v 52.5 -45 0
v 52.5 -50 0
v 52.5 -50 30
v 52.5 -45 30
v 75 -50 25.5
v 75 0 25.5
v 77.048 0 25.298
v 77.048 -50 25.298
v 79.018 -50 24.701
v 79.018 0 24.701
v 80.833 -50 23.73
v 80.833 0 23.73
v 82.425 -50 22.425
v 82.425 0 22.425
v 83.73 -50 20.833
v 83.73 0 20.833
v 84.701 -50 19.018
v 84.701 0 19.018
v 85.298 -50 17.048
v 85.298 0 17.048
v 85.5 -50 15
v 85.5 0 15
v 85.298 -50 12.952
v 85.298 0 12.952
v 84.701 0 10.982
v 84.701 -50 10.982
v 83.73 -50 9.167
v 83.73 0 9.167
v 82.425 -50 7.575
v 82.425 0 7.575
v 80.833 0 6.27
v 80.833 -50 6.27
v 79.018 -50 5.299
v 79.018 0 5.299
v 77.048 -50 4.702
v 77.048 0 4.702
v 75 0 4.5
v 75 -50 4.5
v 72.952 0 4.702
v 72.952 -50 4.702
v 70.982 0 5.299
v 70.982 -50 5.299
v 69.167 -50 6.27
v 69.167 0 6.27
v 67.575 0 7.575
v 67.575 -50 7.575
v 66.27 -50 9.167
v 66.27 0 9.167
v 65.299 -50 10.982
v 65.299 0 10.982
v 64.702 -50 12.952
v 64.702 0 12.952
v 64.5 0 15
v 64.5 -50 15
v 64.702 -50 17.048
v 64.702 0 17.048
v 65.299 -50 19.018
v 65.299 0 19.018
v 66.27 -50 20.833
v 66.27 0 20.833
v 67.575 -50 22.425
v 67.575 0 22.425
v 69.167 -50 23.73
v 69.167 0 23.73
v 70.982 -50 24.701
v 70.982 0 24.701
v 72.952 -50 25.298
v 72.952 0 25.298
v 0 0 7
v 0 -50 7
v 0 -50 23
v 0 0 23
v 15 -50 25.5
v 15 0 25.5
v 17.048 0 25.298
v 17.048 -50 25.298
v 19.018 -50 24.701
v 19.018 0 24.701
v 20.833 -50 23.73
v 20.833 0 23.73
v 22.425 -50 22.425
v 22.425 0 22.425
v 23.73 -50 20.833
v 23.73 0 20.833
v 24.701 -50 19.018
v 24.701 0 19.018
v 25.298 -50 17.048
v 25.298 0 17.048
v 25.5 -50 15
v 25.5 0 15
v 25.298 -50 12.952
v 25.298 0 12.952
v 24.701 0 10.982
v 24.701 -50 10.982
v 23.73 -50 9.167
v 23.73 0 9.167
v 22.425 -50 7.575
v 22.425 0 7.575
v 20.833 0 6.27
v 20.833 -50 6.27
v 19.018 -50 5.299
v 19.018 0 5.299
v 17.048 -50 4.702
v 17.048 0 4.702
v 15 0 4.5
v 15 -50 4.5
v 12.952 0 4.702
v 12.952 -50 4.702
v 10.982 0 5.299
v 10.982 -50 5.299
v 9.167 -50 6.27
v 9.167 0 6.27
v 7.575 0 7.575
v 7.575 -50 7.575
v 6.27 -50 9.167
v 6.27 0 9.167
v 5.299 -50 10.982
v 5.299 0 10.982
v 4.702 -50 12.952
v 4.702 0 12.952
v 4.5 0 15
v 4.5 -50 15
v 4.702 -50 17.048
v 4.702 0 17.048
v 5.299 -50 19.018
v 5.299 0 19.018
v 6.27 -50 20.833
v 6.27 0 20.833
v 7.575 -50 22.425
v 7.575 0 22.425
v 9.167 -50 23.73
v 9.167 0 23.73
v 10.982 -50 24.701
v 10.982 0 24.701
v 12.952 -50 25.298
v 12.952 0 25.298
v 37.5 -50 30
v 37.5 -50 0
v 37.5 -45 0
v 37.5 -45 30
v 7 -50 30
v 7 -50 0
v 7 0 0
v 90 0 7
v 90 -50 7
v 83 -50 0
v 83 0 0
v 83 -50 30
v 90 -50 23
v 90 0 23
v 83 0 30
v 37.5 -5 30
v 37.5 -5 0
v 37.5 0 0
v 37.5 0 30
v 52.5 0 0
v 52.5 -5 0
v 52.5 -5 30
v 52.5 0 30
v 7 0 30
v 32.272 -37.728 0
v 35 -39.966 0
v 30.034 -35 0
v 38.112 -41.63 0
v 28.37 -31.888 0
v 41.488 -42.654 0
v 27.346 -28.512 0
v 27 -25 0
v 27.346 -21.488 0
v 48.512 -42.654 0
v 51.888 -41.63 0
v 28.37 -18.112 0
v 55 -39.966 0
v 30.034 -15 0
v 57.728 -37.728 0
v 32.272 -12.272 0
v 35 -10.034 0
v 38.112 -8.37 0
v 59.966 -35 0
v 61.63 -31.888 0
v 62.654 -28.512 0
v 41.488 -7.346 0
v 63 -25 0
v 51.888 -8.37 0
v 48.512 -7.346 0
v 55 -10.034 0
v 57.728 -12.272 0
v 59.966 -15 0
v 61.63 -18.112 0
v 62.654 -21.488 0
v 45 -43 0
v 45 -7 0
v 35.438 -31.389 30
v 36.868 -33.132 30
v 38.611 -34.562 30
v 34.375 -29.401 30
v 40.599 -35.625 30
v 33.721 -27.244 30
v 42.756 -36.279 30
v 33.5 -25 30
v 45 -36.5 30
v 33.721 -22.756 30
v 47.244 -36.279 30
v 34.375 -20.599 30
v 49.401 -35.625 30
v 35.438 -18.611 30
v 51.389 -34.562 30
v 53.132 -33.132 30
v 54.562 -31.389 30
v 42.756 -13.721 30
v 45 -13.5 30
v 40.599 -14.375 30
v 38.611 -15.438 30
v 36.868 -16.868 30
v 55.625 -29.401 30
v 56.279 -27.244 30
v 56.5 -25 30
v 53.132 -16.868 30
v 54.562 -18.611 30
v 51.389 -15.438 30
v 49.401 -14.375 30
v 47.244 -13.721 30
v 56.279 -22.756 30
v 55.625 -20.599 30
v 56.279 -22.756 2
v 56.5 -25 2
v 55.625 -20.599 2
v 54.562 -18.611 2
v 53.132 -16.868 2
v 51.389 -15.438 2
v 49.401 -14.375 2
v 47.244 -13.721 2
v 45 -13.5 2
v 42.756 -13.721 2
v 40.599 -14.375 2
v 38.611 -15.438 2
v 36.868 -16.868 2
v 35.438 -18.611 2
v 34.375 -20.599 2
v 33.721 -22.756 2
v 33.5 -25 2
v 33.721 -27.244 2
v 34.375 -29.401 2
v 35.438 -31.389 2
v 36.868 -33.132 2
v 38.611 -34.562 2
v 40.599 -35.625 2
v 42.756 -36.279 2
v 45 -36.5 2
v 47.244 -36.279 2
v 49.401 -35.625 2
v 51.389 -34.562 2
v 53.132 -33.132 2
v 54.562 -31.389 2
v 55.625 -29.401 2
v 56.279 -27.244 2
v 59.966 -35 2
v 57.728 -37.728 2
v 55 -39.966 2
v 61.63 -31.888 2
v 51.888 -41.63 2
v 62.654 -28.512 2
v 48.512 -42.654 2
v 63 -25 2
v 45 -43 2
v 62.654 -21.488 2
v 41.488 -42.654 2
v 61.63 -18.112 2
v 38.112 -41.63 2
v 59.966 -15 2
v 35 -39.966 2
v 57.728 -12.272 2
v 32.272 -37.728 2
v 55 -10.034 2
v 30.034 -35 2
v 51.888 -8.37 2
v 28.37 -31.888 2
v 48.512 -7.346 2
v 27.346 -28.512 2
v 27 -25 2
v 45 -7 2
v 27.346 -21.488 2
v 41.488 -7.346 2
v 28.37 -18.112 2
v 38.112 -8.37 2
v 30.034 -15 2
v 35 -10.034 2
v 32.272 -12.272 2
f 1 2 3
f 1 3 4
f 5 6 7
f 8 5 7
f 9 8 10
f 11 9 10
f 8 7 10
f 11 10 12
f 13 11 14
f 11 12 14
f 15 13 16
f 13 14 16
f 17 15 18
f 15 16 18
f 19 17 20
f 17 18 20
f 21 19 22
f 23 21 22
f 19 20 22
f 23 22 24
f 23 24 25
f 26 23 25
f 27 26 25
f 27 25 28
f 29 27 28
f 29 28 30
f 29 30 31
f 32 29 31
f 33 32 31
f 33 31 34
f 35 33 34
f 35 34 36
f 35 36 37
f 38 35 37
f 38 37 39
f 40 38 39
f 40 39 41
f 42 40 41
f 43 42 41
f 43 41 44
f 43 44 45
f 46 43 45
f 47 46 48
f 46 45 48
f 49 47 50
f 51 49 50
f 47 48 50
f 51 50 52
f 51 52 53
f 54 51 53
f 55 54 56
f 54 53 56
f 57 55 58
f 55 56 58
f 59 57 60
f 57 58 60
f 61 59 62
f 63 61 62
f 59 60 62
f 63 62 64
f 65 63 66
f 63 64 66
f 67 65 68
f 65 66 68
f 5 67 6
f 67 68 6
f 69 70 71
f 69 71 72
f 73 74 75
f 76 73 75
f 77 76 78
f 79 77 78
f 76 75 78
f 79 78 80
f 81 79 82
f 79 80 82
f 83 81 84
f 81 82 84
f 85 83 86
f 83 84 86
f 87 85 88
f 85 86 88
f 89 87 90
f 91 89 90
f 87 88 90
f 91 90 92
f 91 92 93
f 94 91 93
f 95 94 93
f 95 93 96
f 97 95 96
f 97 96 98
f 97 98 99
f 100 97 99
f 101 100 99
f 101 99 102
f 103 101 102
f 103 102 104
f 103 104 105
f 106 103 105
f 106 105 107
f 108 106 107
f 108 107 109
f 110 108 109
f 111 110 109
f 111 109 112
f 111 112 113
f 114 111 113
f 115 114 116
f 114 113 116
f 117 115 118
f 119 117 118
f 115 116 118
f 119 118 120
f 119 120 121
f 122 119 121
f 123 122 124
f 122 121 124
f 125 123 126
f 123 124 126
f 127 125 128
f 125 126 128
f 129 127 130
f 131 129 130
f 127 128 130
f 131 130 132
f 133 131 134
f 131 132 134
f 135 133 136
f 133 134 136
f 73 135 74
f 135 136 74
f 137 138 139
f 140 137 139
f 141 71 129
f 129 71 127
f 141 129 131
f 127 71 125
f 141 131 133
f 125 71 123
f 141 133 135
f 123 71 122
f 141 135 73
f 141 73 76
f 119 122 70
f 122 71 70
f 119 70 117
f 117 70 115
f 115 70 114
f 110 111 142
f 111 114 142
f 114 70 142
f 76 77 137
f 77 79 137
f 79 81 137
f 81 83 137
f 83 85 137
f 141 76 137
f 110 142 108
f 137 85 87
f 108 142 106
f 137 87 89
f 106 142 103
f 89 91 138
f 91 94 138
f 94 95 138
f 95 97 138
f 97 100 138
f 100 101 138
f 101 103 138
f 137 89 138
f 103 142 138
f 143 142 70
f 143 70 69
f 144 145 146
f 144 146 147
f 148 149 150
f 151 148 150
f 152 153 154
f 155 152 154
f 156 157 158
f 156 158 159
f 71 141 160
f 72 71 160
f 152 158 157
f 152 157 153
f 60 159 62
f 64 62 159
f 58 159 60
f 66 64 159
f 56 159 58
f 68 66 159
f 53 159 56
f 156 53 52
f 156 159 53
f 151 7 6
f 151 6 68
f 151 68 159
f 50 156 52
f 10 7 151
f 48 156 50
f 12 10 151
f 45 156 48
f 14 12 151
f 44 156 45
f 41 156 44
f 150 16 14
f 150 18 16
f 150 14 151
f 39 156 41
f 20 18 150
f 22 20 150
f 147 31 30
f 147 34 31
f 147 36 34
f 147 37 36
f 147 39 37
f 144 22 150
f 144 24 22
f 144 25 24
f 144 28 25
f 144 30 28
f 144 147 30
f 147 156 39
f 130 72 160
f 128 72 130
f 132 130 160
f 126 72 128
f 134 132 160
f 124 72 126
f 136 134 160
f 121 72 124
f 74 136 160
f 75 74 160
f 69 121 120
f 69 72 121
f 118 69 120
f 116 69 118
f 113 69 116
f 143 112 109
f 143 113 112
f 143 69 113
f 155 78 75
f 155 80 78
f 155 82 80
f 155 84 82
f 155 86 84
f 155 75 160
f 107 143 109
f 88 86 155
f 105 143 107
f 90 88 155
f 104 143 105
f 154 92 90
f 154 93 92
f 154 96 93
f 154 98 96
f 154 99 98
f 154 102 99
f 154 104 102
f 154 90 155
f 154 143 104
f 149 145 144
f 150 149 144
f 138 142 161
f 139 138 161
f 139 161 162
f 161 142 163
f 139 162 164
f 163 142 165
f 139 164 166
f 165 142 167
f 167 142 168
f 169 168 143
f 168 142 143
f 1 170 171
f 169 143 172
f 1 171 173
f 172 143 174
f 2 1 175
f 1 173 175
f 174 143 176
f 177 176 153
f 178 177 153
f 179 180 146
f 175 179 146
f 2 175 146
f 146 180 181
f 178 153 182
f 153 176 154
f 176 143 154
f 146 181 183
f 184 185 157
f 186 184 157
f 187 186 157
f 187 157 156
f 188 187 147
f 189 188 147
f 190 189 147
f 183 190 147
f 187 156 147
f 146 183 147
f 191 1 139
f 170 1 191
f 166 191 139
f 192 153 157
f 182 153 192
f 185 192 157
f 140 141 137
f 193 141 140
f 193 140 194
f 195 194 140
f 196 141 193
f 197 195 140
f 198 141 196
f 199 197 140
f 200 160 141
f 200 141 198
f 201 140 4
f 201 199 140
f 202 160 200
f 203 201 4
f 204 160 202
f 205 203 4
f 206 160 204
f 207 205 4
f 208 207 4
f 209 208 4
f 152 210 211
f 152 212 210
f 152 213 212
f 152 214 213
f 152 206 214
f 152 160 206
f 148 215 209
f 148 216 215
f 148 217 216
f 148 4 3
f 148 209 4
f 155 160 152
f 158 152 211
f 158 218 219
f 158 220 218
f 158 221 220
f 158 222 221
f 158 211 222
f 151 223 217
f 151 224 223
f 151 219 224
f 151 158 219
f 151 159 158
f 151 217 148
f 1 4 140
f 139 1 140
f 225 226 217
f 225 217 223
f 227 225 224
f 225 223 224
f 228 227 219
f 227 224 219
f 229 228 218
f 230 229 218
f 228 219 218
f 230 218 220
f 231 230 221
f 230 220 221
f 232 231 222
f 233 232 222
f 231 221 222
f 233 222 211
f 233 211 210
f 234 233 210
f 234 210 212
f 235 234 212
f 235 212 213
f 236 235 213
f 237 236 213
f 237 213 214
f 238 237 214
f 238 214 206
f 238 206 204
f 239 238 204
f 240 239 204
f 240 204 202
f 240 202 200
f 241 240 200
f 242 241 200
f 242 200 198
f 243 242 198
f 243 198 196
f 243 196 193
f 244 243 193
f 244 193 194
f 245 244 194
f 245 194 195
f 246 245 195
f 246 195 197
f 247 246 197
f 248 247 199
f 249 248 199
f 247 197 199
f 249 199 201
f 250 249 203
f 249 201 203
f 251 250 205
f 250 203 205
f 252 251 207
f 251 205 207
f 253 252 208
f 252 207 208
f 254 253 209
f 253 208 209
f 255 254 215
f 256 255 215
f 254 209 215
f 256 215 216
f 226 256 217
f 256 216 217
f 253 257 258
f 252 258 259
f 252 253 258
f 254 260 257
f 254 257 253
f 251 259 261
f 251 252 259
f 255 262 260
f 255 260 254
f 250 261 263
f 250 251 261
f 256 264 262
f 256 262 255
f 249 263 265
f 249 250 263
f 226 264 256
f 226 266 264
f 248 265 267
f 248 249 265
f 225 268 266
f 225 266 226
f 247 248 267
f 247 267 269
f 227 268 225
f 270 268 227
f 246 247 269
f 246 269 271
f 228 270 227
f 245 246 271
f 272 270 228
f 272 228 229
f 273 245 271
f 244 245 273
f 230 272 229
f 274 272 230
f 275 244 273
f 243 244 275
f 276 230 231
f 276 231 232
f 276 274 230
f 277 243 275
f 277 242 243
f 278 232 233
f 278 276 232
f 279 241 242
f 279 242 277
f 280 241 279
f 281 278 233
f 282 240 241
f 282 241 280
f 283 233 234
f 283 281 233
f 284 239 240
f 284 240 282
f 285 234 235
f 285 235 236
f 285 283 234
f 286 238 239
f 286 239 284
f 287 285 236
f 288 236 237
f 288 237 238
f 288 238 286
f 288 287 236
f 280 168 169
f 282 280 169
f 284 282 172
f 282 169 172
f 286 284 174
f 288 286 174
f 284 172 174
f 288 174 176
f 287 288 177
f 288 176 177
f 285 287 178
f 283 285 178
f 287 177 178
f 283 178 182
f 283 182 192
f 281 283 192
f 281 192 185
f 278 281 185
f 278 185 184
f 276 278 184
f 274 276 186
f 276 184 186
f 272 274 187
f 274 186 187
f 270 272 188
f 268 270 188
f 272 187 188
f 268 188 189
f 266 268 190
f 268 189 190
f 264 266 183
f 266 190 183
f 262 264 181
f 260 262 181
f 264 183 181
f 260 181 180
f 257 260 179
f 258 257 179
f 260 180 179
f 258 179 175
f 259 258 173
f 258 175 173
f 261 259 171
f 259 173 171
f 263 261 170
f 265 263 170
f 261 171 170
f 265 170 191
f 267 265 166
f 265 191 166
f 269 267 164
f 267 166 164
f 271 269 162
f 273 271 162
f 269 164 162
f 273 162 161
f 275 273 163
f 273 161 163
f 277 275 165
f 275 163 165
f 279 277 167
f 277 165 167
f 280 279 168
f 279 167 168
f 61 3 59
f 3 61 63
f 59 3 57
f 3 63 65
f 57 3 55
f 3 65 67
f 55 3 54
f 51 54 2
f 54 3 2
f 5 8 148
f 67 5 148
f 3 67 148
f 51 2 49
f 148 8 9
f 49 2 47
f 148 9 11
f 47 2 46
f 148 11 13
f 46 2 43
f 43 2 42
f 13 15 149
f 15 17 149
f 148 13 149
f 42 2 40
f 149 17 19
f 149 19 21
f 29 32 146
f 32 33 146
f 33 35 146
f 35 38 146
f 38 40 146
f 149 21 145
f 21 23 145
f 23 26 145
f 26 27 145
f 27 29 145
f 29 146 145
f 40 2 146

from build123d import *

# Parameters (mm, degrees)
SKETCH_1_W          = 90
SKETCH_1_H          = 50
EXTRUDE_1_DEPTH     = 30
SKETCH_3_R          = 10.5
CUT_EXTRUDE_2_DEPTH = 108.238052948
CHAMFER_1_SIZE      = 7
SKETCH_8_R          = 18
CUT_EXTRUDE_5_DEPTH = 2
SKETCH_7_R          = 11.5
CUT_EXTRUDE_6_DEPTH = 120
SKETCH_12_W         = 15
SKETCH_12_H         = 5
CUT_EXTRUDE_8_DEPTH = 70


with BuildPart() as part:
    # 草图1 → 拉伸1 (new body)
    with BuildSketch(Plane.XY):
        with Locations((45, -25)):
            Rectangle(SKETCH_1_W, SKETCH_1_H)
    extrude(amount=EXTRUDE_1_DEPTH)

    # 草图3 → 切除-拉伸2 (cut, through all)
    with BuildSketch(Plane(origin=(0, 0, 0), x_dir=(1, 0, 0), z_dir=(0, 1, 0))):
        with Locations(Location((15, -15, 0), (0, 0, 270))):
            Circle(SKETCH_3_R)
        with Locations(Location((75, -15, 0), (0, 0, 270))):
            Circle(SKETCH_3_R)
    extrude(amount=-CUT_EXTRUDE_2_DEPTH, mode=Mode.SUBTRACT)

    # 倒角1
    chamfer_1_edges = [part.edges().sort_by_distance(p)[0] for p in [
        (90, -25, 30),
        (0, -25, 30),
        (90, -25, 0),
        (0, -25, 0),
    ]]
    chamfer(chamfer_1_edges, length=CHAMFER_1_SIZE)

    # 草图8 → 切除-拉伸5 (cut)
    with BuildSketch(Plane(origin=(0, 0, 0), x_dir=(-1, 0, 0), z_dir=(0, 0, -1))):
        with Locations((-45, -25)):
            Circle(SKETCH_8_R)
    extrude(amount=-CUT_EXTRUDE_5_DEPTH, mode=Mode.SUBTRACT)

    # 草图7 → 切除-拉伸6 (cut)
    with BuildSketch(Plane.XY.offset(30)):
        with Locations((45, -25)):
            Circle(SKETCH_7_R)
    extrude(amount=-CUT_EXTRUDE_6_DEPTH, mode=Mode.SUBTRACT)

    # 草图12 → 切除-拉伸8 (cut)
    with BuildSketch(Plane(origin=(0, 0, 0), x_dir=(-1, 0, 0), z_dir=(0, 0, -1))):
        with Locations((-45, -2.5)):
            Rectangle(SKETCH_12_W, SKETCH_12_H)
        with Locations((-45, -47.5)):
            Rectangle(SKETCH_12_W, SKETCH_12_H)
    extrude(amount=-CUT_EXTRUDE_8_DEPTH, mode=Mode.SUBTRACT)


solid = part.part
